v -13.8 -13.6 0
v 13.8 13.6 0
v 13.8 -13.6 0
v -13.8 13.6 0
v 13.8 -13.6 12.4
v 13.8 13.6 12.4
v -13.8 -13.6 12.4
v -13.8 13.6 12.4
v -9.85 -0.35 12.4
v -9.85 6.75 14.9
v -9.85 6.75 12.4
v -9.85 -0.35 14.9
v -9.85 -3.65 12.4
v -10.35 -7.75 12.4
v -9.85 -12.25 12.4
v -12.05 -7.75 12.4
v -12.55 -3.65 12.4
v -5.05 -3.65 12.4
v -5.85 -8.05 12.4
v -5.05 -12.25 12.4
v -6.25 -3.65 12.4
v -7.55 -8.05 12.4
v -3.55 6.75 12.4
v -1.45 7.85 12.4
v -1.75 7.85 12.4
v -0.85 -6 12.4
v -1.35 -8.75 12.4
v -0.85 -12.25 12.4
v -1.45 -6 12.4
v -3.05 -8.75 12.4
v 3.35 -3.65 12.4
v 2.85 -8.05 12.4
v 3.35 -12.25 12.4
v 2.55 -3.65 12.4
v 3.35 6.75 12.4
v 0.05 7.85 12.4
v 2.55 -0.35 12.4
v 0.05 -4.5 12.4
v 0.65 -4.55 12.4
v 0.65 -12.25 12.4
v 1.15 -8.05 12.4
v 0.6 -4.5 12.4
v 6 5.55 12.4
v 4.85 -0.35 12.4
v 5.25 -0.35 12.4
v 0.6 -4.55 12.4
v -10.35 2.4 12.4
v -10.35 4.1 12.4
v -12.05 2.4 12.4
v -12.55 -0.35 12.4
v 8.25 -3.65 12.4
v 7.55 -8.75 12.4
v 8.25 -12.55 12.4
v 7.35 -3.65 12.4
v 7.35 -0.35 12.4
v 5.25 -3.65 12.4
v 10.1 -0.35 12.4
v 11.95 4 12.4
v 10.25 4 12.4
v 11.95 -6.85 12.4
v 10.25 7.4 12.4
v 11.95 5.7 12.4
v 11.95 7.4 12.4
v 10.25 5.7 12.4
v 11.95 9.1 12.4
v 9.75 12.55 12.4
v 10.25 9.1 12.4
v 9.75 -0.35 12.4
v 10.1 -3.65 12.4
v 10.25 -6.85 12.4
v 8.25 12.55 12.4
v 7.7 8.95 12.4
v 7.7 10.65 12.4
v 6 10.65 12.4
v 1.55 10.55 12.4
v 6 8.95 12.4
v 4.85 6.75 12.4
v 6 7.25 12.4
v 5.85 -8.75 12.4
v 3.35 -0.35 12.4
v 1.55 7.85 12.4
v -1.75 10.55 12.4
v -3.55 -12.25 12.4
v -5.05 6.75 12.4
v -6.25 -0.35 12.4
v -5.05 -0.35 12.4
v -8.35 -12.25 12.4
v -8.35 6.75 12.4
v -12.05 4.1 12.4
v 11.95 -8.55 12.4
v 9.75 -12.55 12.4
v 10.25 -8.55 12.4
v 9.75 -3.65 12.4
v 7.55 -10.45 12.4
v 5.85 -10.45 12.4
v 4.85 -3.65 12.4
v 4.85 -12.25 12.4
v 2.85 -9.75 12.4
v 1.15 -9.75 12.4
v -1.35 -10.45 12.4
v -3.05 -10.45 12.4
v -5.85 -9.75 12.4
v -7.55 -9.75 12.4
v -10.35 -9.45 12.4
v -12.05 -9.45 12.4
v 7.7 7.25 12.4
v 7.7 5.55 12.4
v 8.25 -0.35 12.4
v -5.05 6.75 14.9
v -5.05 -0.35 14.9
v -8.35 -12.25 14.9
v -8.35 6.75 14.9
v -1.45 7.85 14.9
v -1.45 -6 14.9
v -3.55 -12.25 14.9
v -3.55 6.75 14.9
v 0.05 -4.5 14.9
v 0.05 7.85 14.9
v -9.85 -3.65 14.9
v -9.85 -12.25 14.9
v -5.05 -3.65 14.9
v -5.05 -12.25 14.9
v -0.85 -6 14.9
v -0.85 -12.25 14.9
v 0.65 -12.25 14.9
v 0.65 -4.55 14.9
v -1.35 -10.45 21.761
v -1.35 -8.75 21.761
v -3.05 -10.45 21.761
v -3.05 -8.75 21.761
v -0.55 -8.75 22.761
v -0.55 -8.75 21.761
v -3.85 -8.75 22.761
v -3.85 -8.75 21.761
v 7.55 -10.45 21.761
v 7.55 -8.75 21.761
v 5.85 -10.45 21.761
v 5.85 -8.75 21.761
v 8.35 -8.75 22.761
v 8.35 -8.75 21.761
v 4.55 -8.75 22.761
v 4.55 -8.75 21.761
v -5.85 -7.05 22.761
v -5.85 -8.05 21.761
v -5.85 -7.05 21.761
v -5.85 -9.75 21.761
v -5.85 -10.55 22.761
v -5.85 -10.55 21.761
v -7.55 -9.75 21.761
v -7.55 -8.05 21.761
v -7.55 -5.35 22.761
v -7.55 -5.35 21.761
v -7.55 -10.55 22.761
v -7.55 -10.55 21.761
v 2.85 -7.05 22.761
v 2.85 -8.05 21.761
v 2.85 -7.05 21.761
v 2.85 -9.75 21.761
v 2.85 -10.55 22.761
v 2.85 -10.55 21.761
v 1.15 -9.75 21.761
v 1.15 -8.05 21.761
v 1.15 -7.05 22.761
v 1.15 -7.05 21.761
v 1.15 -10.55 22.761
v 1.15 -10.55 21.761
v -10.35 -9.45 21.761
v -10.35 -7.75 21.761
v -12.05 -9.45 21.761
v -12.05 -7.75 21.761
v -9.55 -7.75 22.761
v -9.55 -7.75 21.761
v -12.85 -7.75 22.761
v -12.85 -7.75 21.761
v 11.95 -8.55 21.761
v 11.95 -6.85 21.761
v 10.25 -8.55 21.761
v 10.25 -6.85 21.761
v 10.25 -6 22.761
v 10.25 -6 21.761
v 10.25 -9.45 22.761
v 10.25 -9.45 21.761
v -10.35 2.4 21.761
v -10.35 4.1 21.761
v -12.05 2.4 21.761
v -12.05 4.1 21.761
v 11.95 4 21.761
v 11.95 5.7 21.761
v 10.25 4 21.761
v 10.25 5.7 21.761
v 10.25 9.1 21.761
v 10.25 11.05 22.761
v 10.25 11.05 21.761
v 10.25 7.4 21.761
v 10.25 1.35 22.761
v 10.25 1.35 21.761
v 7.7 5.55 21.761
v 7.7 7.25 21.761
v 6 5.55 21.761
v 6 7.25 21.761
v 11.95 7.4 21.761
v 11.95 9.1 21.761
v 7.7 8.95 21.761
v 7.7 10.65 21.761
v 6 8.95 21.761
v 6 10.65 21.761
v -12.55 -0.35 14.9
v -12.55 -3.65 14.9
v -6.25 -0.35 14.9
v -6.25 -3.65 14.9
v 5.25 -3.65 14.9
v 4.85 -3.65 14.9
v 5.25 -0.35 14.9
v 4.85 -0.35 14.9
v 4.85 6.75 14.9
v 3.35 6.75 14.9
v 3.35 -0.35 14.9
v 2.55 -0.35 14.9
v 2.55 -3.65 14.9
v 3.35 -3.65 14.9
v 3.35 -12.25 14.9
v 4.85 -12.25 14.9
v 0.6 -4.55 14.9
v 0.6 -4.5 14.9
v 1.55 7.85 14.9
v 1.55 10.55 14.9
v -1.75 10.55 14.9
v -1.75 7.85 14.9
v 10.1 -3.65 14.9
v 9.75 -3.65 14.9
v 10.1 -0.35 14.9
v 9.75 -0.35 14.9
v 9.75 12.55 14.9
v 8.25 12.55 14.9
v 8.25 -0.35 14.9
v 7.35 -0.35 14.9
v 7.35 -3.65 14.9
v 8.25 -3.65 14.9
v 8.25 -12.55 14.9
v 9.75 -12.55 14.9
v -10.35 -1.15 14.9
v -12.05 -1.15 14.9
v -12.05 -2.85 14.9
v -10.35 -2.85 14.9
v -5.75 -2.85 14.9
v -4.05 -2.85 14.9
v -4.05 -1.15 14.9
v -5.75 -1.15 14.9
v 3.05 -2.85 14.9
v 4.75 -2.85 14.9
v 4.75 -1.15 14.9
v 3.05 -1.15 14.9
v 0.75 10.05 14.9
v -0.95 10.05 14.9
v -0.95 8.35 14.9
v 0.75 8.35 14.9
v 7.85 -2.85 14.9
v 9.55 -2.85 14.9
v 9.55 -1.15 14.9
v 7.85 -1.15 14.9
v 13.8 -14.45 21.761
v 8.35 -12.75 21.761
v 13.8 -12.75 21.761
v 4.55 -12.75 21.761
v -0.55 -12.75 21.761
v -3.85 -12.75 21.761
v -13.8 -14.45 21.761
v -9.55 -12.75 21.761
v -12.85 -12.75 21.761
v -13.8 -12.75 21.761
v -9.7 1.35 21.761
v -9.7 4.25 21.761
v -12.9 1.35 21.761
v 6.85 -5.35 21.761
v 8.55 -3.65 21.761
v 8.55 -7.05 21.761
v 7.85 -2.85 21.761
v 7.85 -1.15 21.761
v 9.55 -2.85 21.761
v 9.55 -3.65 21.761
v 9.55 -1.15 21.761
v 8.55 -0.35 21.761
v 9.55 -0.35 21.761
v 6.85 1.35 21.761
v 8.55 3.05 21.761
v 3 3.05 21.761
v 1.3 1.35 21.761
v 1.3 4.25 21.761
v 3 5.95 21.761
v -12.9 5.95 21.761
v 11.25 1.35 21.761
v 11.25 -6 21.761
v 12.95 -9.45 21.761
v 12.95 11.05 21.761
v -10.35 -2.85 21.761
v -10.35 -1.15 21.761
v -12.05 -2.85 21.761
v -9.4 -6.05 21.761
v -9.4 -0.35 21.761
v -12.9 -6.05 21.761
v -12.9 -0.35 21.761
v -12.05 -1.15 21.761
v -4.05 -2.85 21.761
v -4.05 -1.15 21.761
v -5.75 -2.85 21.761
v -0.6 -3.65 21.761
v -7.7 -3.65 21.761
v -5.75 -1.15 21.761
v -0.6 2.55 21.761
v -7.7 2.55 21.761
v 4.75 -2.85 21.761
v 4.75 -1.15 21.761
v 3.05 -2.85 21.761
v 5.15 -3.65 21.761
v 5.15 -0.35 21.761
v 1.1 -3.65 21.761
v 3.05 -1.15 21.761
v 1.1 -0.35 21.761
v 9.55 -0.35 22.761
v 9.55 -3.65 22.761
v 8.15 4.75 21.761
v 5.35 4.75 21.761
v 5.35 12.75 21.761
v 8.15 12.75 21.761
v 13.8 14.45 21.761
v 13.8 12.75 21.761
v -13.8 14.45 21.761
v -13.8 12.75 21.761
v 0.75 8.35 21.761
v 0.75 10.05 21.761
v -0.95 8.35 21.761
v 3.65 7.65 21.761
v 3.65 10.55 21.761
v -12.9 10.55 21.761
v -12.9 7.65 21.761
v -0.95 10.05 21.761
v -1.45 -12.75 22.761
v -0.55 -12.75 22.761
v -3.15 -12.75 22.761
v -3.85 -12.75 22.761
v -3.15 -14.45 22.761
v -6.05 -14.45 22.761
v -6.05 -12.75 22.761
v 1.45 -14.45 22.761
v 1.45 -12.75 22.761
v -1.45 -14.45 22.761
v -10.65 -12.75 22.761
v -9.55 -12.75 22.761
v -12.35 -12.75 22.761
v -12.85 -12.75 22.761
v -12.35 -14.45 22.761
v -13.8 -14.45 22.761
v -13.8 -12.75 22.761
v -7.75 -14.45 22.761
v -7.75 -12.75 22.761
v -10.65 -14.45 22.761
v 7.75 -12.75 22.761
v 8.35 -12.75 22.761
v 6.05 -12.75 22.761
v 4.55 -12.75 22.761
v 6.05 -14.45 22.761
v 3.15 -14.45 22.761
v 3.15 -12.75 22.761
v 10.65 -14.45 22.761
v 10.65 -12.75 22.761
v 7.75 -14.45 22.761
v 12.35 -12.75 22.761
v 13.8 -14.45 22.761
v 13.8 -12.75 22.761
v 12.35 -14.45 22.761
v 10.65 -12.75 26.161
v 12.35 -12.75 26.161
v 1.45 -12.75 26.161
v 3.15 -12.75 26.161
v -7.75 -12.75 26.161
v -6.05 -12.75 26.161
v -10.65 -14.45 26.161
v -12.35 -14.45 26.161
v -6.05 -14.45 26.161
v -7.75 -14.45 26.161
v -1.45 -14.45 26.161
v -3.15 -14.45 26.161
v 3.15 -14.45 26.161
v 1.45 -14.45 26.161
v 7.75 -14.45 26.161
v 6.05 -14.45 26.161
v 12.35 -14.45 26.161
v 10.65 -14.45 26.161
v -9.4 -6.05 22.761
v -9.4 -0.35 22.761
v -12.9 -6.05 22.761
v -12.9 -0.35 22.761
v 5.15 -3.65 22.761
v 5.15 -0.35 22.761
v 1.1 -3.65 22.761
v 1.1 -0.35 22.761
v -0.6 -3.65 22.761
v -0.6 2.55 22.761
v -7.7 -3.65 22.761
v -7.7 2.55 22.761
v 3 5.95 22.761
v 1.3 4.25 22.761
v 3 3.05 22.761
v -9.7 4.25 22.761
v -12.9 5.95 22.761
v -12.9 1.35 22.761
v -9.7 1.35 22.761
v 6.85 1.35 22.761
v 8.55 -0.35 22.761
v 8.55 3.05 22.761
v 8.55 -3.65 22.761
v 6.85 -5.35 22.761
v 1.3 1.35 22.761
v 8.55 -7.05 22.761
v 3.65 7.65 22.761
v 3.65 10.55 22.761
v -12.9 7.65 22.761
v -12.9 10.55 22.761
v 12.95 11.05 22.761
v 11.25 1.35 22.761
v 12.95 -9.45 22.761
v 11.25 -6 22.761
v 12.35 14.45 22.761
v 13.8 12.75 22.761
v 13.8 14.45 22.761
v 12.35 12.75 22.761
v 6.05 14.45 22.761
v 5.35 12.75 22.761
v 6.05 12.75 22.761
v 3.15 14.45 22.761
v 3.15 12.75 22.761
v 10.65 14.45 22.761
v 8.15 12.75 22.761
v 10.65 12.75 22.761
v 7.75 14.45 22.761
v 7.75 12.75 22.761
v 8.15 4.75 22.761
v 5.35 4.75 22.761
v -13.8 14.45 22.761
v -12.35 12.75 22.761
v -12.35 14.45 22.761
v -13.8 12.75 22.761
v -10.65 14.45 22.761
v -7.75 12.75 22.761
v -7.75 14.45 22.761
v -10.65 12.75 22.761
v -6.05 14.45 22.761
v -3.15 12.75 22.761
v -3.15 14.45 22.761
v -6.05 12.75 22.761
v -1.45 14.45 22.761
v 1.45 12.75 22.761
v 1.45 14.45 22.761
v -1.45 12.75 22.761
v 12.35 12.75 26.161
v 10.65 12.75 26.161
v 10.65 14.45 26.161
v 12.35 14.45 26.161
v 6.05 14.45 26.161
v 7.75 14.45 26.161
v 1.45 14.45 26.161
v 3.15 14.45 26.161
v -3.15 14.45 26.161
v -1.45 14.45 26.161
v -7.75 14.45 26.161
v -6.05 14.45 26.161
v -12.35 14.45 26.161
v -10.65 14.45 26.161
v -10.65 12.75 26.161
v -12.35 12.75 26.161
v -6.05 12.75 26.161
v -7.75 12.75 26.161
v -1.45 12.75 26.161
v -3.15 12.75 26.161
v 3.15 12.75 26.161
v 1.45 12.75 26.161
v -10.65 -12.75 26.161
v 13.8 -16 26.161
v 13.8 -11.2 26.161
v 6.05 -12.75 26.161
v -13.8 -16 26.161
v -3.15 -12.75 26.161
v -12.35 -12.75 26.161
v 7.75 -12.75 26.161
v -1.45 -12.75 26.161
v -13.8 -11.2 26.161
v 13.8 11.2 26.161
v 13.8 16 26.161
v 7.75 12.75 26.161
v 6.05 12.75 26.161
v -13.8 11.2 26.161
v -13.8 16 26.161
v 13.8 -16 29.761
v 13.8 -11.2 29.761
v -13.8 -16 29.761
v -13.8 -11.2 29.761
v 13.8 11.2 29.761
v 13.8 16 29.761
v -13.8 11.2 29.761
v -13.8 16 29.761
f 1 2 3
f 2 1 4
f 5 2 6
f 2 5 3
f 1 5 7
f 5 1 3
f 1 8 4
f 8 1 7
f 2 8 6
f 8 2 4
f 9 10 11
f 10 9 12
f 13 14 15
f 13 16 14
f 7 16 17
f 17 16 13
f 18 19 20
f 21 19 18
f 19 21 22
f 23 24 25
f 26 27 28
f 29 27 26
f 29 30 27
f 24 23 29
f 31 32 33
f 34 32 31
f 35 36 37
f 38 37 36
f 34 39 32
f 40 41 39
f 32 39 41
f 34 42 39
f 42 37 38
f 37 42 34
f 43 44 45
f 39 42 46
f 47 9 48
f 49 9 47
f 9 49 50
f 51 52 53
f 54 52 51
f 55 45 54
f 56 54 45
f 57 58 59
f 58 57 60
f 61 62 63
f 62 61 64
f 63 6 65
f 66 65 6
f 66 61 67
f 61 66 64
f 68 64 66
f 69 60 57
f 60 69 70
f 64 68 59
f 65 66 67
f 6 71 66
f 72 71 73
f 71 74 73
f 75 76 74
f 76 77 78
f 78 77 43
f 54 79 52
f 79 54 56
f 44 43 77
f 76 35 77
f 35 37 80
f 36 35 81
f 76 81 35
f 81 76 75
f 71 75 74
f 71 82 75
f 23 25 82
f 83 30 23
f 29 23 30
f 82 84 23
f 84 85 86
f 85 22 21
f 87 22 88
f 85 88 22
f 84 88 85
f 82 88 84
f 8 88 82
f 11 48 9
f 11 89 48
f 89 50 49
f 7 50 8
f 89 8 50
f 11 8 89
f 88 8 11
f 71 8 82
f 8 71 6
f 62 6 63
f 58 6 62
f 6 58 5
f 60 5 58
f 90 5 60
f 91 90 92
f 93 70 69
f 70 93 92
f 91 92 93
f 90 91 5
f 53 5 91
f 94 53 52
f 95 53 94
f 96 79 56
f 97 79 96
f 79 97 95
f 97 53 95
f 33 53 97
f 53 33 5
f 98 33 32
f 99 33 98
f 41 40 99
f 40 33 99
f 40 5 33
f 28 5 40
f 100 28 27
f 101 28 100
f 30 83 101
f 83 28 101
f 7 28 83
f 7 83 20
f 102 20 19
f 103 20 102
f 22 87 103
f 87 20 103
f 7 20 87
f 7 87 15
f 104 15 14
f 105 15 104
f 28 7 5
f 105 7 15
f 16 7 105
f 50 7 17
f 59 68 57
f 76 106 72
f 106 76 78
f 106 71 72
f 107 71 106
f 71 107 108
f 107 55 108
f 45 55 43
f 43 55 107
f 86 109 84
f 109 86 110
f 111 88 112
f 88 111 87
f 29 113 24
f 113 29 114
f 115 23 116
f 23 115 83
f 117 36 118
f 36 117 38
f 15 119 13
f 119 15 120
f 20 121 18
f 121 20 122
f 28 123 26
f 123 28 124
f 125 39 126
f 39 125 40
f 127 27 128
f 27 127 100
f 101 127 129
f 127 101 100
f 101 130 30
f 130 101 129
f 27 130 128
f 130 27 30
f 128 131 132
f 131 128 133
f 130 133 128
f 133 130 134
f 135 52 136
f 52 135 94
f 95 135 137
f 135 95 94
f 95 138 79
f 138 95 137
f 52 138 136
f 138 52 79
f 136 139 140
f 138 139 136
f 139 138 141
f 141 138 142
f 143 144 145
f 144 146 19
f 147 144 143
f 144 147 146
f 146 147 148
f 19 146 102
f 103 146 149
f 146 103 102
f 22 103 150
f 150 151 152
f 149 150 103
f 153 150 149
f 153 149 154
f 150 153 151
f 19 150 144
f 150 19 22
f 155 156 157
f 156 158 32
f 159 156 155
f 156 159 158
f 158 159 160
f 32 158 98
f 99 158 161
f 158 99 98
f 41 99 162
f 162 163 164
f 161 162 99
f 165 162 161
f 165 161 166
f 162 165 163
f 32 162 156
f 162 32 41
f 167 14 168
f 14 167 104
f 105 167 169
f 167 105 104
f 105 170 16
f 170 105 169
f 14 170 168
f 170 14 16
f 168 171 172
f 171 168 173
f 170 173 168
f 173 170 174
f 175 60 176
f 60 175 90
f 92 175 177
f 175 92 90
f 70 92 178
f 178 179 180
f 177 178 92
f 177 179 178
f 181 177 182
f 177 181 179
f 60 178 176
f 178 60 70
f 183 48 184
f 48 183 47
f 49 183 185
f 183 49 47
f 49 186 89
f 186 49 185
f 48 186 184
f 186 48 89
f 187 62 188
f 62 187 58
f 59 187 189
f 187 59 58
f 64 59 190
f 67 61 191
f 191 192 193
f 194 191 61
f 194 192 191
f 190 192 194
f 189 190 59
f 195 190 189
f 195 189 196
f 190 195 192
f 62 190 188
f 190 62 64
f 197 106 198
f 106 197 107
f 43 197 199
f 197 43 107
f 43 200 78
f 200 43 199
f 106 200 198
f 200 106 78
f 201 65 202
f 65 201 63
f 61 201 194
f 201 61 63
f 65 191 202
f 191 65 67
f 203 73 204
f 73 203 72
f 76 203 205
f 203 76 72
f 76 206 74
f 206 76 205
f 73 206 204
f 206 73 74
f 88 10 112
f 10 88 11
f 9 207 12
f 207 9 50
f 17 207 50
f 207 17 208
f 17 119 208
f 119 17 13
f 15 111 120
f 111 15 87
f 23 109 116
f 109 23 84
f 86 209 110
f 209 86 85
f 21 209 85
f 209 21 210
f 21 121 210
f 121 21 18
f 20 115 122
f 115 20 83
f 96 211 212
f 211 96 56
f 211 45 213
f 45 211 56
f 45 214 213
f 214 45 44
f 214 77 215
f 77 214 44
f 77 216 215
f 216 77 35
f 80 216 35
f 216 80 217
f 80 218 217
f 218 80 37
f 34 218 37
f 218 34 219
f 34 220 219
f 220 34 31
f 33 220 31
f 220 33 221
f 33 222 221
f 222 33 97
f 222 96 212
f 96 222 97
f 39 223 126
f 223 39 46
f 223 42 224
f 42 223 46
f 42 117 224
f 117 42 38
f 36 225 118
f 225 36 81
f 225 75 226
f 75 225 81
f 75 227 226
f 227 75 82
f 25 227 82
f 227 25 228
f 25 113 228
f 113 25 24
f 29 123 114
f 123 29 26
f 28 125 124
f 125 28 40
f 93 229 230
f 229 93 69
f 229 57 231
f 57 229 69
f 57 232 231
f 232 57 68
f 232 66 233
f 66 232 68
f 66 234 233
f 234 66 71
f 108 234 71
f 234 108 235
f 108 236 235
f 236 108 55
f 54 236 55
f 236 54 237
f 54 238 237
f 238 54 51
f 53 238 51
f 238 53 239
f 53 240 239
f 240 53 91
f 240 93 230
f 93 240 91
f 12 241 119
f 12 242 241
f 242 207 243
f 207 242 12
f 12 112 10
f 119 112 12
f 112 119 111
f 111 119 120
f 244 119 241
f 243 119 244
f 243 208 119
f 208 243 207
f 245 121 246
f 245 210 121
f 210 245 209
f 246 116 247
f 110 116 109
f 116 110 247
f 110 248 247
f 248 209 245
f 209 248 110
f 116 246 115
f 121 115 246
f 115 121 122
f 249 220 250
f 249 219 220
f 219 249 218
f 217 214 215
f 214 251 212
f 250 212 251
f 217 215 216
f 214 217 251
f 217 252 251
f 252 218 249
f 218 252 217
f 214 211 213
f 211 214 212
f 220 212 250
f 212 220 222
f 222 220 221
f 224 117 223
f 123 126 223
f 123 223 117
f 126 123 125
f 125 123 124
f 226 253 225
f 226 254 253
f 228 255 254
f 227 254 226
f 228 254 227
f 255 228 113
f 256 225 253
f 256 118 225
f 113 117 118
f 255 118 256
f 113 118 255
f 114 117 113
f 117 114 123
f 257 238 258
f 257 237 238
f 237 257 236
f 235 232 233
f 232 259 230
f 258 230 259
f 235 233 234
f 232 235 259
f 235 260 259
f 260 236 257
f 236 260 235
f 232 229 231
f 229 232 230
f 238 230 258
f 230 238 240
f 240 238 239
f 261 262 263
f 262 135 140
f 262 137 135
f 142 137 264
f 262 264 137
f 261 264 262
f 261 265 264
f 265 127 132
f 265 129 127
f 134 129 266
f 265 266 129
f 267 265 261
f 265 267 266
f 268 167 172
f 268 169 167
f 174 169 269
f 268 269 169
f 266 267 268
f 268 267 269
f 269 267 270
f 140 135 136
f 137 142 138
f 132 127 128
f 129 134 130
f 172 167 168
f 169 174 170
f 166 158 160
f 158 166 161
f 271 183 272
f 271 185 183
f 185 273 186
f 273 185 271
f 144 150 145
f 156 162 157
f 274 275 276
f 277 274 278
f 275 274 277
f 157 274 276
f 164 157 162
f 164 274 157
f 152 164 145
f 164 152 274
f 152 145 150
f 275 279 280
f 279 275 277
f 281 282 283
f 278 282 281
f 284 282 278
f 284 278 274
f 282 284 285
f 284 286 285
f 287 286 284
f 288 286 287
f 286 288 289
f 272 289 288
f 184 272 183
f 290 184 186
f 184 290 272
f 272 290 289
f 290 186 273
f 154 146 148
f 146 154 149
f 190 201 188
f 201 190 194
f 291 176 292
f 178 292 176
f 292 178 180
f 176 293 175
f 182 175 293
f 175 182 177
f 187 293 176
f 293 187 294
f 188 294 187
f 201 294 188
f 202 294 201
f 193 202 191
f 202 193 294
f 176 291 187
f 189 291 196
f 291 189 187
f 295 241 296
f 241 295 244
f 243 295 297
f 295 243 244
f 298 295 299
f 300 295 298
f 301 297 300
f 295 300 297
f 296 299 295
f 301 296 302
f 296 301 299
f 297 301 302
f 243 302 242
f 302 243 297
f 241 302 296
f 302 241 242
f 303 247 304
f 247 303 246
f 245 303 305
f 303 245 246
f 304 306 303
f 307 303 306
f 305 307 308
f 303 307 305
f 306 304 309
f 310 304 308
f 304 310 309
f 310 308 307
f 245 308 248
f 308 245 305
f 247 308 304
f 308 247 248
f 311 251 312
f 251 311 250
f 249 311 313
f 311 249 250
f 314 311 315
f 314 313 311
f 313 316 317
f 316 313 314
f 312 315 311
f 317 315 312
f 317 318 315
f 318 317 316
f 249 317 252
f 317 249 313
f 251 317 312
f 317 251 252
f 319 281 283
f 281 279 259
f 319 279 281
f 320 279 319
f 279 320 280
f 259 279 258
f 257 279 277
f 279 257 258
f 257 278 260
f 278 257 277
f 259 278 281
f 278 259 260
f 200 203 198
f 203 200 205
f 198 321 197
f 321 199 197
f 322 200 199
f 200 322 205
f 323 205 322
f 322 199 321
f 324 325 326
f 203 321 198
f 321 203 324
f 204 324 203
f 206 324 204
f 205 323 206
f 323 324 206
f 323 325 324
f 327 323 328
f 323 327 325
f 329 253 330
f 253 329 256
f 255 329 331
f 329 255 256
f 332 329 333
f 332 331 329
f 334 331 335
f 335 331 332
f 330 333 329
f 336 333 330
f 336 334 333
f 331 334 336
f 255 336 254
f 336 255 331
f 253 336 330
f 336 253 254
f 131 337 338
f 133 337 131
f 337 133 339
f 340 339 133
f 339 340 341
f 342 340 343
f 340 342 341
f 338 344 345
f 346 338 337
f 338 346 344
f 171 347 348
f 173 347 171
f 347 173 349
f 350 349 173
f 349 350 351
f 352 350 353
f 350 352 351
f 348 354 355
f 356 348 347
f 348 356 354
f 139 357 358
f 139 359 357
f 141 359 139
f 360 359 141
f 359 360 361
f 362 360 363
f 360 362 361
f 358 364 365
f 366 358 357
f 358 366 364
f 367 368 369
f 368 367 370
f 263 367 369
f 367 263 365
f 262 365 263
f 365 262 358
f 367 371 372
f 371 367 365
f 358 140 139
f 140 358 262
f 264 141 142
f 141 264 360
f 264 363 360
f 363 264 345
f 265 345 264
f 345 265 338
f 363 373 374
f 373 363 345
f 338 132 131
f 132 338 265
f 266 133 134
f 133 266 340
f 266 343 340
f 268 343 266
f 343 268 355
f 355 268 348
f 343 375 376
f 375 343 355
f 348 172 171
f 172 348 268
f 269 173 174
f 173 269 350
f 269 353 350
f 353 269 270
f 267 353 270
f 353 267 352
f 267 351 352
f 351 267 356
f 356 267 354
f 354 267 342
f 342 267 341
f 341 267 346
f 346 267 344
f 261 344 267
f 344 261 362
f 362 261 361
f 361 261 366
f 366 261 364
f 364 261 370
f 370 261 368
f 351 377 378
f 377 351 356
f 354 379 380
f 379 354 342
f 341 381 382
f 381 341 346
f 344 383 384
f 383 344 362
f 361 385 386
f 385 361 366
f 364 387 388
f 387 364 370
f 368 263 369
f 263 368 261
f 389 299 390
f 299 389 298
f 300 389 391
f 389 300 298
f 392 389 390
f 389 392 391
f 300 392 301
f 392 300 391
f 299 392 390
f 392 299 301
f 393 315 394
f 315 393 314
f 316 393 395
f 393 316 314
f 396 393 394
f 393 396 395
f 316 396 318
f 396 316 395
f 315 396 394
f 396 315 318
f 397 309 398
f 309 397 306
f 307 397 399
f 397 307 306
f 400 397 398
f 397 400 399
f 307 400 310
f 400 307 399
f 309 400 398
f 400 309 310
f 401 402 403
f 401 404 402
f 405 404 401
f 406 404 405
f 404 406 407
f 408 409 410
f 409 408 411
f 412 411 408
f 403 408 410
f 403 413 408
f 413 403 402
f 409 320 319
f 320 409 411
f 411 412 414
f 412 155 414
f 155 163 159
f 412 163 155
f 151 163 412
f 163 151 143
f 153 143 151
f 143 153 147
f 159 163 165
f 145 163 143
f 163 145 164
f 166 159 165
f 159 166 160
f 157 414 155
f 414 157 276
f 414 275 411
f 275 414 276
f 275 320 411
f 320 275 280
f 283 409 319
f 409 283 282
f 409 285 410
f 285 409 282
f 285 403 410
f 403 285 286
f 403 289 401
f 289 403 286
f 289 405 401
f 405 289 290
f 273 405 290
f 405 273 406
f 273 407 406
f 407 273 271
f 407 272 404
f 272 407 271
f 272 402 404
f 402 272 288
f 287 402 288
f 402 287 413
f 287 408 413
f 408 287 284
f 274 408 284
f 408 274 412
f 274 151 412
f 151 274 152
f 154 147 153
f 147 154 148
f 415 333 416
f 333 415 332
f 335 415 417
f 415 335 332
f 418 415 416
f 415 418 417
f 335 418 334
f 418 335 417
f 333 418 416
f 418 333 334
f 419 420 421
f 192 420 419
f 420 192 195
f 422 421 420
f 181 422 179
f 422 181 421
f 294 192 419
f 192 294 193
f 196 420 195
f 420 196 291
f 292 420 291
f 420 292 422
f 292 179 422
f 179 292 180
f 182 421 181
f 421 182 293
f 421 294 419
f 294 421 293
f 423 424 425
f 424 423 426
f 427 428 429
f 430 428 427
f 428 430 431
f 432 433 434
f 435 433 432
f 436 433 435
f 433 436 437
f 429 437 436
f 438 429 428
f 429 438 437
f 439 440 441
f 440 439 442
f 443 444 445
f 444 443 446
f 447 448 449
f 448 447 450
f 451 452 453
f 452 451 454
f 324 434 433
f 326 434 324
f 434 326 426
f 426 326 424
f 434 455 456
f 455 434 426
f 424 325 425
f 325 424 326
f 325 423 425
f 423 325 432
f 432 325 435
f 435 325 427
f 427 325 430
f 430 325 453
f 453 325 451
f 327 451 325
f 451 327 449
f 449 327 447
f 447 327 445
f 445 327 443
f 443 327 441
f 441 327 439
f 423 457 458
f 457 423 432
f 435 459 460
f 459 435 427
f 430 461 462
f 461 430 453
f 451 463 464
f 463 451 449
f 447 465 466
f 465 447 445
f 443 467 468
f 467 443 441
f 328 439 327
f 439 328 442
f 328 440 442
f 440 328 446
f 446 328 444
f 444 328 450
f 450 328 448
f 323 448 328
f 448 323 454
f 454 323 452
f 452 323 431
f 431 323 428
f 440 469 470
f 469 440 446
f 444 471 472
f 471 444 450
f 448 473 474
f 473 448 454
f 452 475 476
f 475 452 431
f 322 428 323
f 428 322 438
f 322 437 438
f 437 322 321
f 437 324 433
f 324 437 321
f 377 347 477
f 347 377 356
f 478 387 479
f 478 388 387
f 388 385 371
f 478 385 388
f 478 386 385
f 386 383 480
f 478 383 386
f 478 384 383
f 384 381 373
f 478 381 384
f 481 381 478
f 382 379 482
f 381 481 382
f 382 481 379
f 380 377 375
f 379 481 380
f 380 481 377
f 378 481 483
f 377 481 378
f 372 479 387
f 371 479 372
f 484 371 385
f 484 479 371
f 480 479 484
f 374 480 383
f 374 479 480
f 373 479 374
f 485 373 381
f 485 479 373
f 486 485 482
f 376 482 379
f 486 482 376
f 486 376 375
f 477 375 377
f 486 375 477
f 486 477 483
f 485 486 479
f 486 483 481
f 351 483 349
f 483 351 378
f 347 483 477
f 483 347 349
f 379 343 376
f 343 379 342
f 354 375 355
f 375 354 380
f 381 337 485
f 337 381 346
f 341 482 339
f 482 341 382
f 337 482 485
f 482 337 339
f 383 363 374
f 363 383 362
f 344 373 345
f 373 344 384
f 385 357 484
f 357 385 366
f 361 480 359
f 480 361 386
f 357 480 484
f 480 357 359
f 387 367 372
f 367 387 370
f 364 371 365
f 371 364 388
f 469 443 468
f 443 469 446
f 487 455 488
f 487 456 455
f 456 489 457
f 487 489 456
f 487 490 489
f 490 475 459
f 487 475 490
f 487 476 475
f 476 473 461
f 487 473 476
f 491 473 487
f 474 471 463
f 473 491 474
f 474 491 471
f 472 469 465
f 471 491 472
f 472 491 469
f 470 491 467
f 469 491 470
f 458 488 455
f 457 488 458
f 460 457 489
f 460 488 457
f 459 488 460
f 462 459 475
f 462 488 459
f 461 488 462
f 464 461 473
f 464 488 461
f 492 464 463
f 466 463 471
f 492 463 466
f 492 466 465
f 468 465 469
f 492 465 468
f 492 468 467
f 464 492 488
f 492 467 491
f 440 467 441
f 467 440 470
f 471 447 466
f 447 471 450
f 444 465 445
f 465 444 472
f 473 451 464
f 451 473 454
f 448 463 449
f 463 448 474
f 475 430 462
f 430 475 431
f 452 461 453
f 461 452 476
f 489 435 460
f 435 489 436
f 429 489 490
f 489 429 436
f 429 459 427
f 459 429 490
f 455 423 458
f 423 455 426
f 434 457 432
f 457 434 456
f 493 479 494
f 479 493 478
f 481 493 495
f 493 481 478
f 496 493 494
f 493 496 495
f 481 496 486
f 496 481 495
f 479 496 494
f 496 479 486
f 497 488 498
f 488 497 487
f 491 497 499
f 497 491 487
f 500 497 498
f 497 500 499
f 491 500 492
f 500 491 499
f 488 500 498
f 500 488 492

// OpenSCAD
// Generated by SolidPython 0.4.2 on 2020-09-29 23:22:15
//!OpenSCAD

scale(v = 0.0100000000) {
	translate(v = [-1380, -1360, 0]) {
		union() {
			color(c = [0.4000000000, 0.4000000000, 0.4000000000]) {
				translate(v = [0, 0, 0]) {
					linear_extrude(height = 1000.0000000000) {
						polygon(paths = [[0, 1, 2, 3]], points = [[0, 0], [0, 2720], [2760, 2720], [2760, 0]]);
					}
				}
			}
			color(c = [0.2000000000, 0.6000000000, 0.2000000000]) {
				translate(v = [0, 0, 1000.0000000000]) {
					linear_extrude(height = 120.0000000000) {
						polygon(paths = [[0, 1, 2, 3]], points = [[0, 1305], [0, 2720], [2760, 2720], [2760, 1305]]);
					}
				}
			}
			color(c = [0.4000000000, 0.4000000000, 0.4000000000]) {
				translate(v = [0, 0, 1000.0000000000]) {
					linear_extrude(height = 120.0000000000) {
						polygon(paths = [[0, 1, 2, 3]], points = [[0, 0], [0, 1305], [2760, 1305], [2760, 0]]);
					}
				}
			}
			color(c = [0.9000000000, 0.6000000000, 0.6000000000]) {
				translate(v = [0, 0, 1120.0000000000]) {
					linear_extrude(height = 120.0000000000) {
						polygon(paths = [[0, 1, 2, 3]], points = [[135, 1485], [135, 1905], [395, 1905], [395, 1485]]);
					}
				}
			}
			color(c = [0.9000000000, 0.6000000000, 0.6000000000]) {
				translate(v = [0, 0, 1120.0000000000]) {
					linear_extrude(height = 120.0000000000) {
						polygon(paths = [[0, 1, 2, 3]], points = [[545, 1485], [545, 1905], [875, 1905], [875, 1485]]);
					}
				}
			}
			color(c = [0.9000000000, 0.6000000000, 0.6000000000]) {
				translate(v = [0, 0, 1120.0000000000]) {
					linear_extrude(height = 120.0000000000) {
						polygon(paths = [[0, 1, 2, 3]], points = [[1025, 1485], [1025, 1905], [1235, 1905], [1235, 1485]]);
					}
				}
			}
			color(c = [0.9000000000, 0.6000000000, 0.6000000000]) {
				translate(v = [0, 0, 1120.0000000000]) {
					linear_extrude(height = 120.0000000000) {
						polygon(paths = [[0, 1, 2, 3]], points = [[1385, 1485], [1385, 1905], [1715, 1905], [1715, 1485]]);
					}
				}
			}
			color(c = [0.9000000000, 0.6000000000, 0.6000000000]) {
				translate(v = [0, 0, 1120.0000000000]) {
					linear_extrude(height = 120.0000000000) {
						polygon(paths = [[0, 1, 2, 3, 4, 5]], points = [[1865, 1485], [1865, 1905], [1940, 1905], [1940, 2485], [2205, 2485], [2205, 1485]]);
					}
				}
			}
			color(c = [0.9000000000, 0.6000000000, 0.6000000000]) {
				translate(v = [0, 0, 1120.0000000000]) {
					linear_extrude(height = 120.0000000000) {
						polygon(paths = [[0, 1, 2, 3]], points = [[2355, 1485], [2355, 2485], [2625, 2485], [2625, 1485]]);
					}
				}
			}
			color(c = [0.9000000000, 0.6000000000, 0.9000000000]) {
				translate(v = [0, 0, 1120.0000000000]) {
					linear_extrude(height = 120.0000000000) {
						polygon(paths = [[0, 1, 2, 3]], points = [[135, 265], [135, 685], [395, 685], [395, 265]]);
					}
				}
			}
			color(c = [0.9000000000, 0.6000000000, 0.9000000000]) {
				translate(v = [0, 0, 1120.0000000000]) {
					linear_extrude(height = 120.0000000000) {
						polygon(paths = [[0, 1, 2, 3]], points = [[545, 265], [545, 685], [875, 685], [875, 265]]);
					}
				}
			}
			color(c = [0.9000000000, 0.6000000000, 0.9000000000]) {
				translate(v = [0, 0, 1120.0000000000]) {
					linear_extrude(height = 120.0000000000) {
						polygon(paths = [[0, 1, 2, 3]], points = [[1025, 265], [1025, 685], [1295, 685], [1295, 265]]);
					}
				}
			}
			color(c = [0.9000000000, 0.6000000000, 0.9000000000]) {
				translate(v = [0, 0, 1120.0000000000]) {
					linear_extrude(height = 120.0000000000) {
						polygon(paths = [[0, 1, 2, 3]], points = [[1445, 265], [1445, 685], [1715, 685], [1715, 265]]);
					}
				}
			}
			color(c = [0.9000000000, 0.6000000000, 0.9000000000]) {
				translate(v = [0, 0, 1120.0000000000]) {
					linear_extrude(height = 120.0000000000) {
						polygon(paths = [[0, 1, 2, 3, 4, 5, 6, 7]], points = [[1940, 235], [1940, 265], [1865, 265], [1865, 685], [1940, 685], [1940, 885], [2205, 885], [2205, 235]]);
					}
				}
			}
			color(c = [0.9000000000, 0.6000000000, 0.9000000000]) {
				translate(v = [0, 0, 1120.0000000000]) {
					linear_extrude(height = 120.0000000000) {
						polygon(paths = [[0, 1, 2, 3]], points = [[2355, 235], [2355, 885], [2625, 885], [2625, 235]]);
					}
				}
			}
			color(c = [0.2000000000, 0.6000000000, 0.2000000000]) {
				translate(v = [0, 0, 1120.0000000000]) {
					linear_extrude(height = 120.0000000000) {
						difference() {
							polygon(paths = [[0, 1, 2, 3]], points = [[0, 1305], [0, 2720], [2760, 2720], [2760, 1305]]);
							polygon(paths = [[0, 1, 2, 3]], points = [[135, 1485], [395, 1485], [395, 1905], [135, 1905]]);
							polygon(paths = [[0, 1, 2, 3]], points = [[545, 1485], [875, 1485], [875, 1905], [545, 1905]]);
							polygon(paths = [[0, 1, 2, 3]], points = [[1025, 1485], [1235, 1485], [1235, 1905], [1025, 1905]]);
							polygon(paths = [[0, 1, 2, 3]], points = [[1385, 1485], [1715, 1485], [1715, 1905], [1385, 1905]]);
							polygon(paths = [[0, 1, 2, 3]], points = [[2355, 1485], [2625, 1485], [2625, 2485], [2355, 2485]]);
							polygon(paths = [[0, 1, 2, 3, 4, 5]], points = [[1865, 1485], [2205, 1485], [2205, 2485], [1940, 2485], [1940, 1905], [1865, 1905]]);
						}
					}
				}
			}
			color(c = [0.4000000000, 0.4000000000, 0.4000000000]) {
				translate(v = [0, 0, 1120.0000000000]) {
					linear_extrude(height = 120.0000000000) {
						difference() {
							polygon(paths = [[0, 1, 2, 3]], points = [[0, 0], [0, 1305], [2760, 1305], [2760, 0]]);
							polygon(paths = [[0, 1, 2, 3]], points = [[2355, 235], [2625, 235], [2625, 885], [2355, 885]]);
							polygon(paths = [[0, 1, 2, 3]], points = [[135, 265], [395, 265], [395, 685], [135, 685]]);
							polygon(paths = [[0, 1, 2, 3]], points = [[545, 265], [875, 265], [875, 685], [545, 685]]);
							polygon(paths = [[0, 1, 2, 3]], points = [[1025, 265], [1295, 265], [1295, 685], [1025, 685]]);
							polygon(paths = [[0, 1, 2, 3]], points = [[1445, 265], [1715, 265], [1715, 685], [1445, 685]]);
							polygon(paths = [[0, 1, 2, 3, 4, 5, 6, 7]], points = [[1940, 235], [2205, 235], [2205, 885], [1940, 885], [1940, 685], [1865, 685], [1865, 265], [1940, 265]]);
						}
					}
				}
			}
			color(c = [0.1000000000, 0.1000000000, 0.1000000000]) {
				translate(v = [0, 0, 1240.0000000000]) {
					linear_extrude(height = 70.0000000000) {
						polygon(paths = [[0, 1, 2, 3]], points = [[1075, 315], [1075, 485], [1245, 485], [1245, 315]]);
					}
				}
			}
			color(c = [0.1000000000, 0.1000000000, 0.1000000000]) {
				translate(v = [0, 0, 1240.0000000000]) {
					linear_extrude(height = 70.0000000000) {
						polygon(paths = [[0, 1, 2, 3]], points = [[1965, 315], [1965, 485], [2135, 485], [2135, 315]]);
					}
				}
			}
			color(c = [0.1000000000, 0.1000000000, 0.1000000000]) {
				translate(v = [0, 0, 1240.0000000000]) {
					linear_extrude(height = 70.0000000000) {
						polygon(paths = [[0, 1, 2, 3]], points = [[625, 385], [625, 555], [795, 555], [795, 385]]);
					}
				}
			}
			color(c = [0.1000000000, 0.1000000000, 0.1000000000]) {
				translate(v = [0, 0, 1240.0000000000]) {
					linear_extrude(height = 70.0000000000) {
						polygon(paths = [[0, 1, 2, 3]], points = [[1495, 385], [1495, 555], [1665, 555], [1665, 385]]);
					}
				}
			}
			color(c = [0.1000000000, 0.1000000000, 0.1000000000]) {
				translate(v = [0, 0, 1240.0000000000]) {
					linear_extrude(height = 70.0000000000) {
						polygon(paths = [[0, 1, 2, 3]], points = [[175, 415], [175, 585], [345, 585], [345, 415]]);
					}
				}
			}
			color(c = [0.1000000000, 0.1000000000, 0.1000000000]) {
				translate(v = [0, 0, 1240.0000000000]) {
					linear_extrude(height = 70.0000000000) {
						polygon(paths = [[0, 1, 2, 3]], points = [[2405, 505], [2405, 675], [2575, 675], [2575, 505]]);
					}
				}
			}
			color(c = [0.1000000000, 0.1000000000, 0.1000000000]) {
				translate(v = [0, 0, 1240.0000000000]) {
					linear_extrude(height = 70.0000000000) {
						polygon(paths = [[0, 1, 2, 3]], points = [[175, 1600], [175, 1770], [345, 1770], [345, 1600]]);
					}
				}
			}
			color(c = [0.1000000000, 0.1000000000, 0.1000000000]) {
				translate(v = [0, 0, 1240.0000000000]) {
					linear_extrude(height = 70.0000000000) {
						polygon(paths = [[0, 1, 2, 3]], points = [[2405, 1760], [2405, 1930], [2575, 1930], [2575, 1760]]);
					}
				}
			}
			color(c = [0.1000000000, 0.1000000000, 0.1000000000]) {
				translate(v = [0, 0, 1240.0000000000]) {
					linear_extrude(height = 70.0000000000) {
						polygon(paths = [[0, 1, 2, 3]], points = [[1980, 1915], [1980, 2085], [2150, 2085], [2150, 1915]]);
					}
				}
			}
			color(c = [0.1000000000, 0.1000000000, 0.1000000000]) {
				translate(v = [0, 0, 1240.0000000000]) {
					linear_extrude(height = 70.0000000000) {
						polygon(paths = [[0, 1, 2, 3]], points = [[2405, 2100], [2405, 2270], [2575, 2270], [2575, 2100]]);
					}
				}
			}
			color(c = [0.1000000000, 0.1000000000, 0.1000000000]) {
				translate(v = [0, 0, 1240.0000000000]) {
					linear_extrude(height = 70.0000000000) {
						polygon(paths = [[0, 1, 2, 3]], points = [[1980, 2255], [1980, 2425], [2150, 2425], [2150, 2255]]);
					}
				}
			}
			color(c = [1.0000000000, 1.0000000000, 1.0000000000]) {
				translate(v = [0, 0, 1240.0000000000]) {
					linear_extrude(height = 70.0000000000) {
						polygon(paths = [[0, 1, 2, 3, 4, 5, 6, 7]], points = [[395, 135], [395, 995], [125, 995], [125, 1325], [395, 1325], [395, 2035], [545, 2035], [545, 135]]);
					}
				}
			}
			color(c = [1.0000000000, 1.0000000000, 1.0000000000]) {
				translate(v = [0, 0, 1240.0000000000]) {
					linear_extrude(height = 70.0000000000) {
						polygon(paths = [[0, 1, 2, 3, 4, 5, 6, 7]], points = [[875, 135], [875, 995], [755, 995], [755, 1325], [875, 1325], [875, 2035], [1025, 2035], [1025, 135]]);
					}
				}
			}
			color(c = [1.0000000000, 1.0000000000, 1.0000000000]) {
				translate(v = [0, 0, 1240.0000000000]) {
					linear_extrude(height = 70.0000000000) {
						polygon(paths = [[0, 1, 2, 3, 4, 5, 6, 7, 8, 9, 10, 11]], points = [[1715, 135], [1715, 995], [1635, 995], [1635, 1325], [1715, 1325], [1715, 2035], [1865, 2035], [1865, 1325], [1905, 1325], [1905, 995], [1865, 995], [1865, 135]]);
					}
				}
			}
			color(c = [1.0000000000, 1.0000000000, 1.0000000000]) {
				translate(v = [0, 0, 1240.0000000000]) {
					linear_extrude(height = 70.0000000000) {
						polygon(paths = [[0, 1, 2, 3, 4, 5, 6, 7, 8, 9, 10, 11, 12, 13]], points = [[1295, 135], [1295, 760], [1235, 760], [1235, 2145], [1205, 2145], [1205, 2415], [1535, 2415], [1535, 2145], [1385, 2145], [1385, 910], [1440, 910], [1440, 905], [1445, 905], [1445, 135]]);
					}
				}
			}
			color(c = [1.0000000000, 1.0000000000, 1.0000000000]) {
				translate(v = [0, 0, 1240.0000000000]) {
					linear_extrude(height = 70.0000000000) {
						polygon(paths = [[0, 1, 2, 3, 4, 5, 6, 7, 8, 9, 10, 11]], points = [[2205, 105], [2205, 995], [2115, 995], [2115, 1325], [2205, 1325], [2205, 2615], [2355, 2615], [2355, 1325], [2390, 1325], [2390, 995], [2355, 995], [2355, 105]]);
					}
				}
			}
			color(c = [0.1000000000, 0.1000000000, 0.1000000000]) {
				translate(v = [0, 0, 1310.0000000000]) {
					linear_extrude(height = 180.0000000000) {
						polygon(paths = [[0, 1, 2, 3]], points = [[1075, 315], [1075, 485], [1245, 485], [1245, 315]]);
					}
				}
			}
			color(c = [0.1000000000, 0.1000000000, 0.1000000000]) {
				translate(v = [0, 0, 1310.0000000000]) {
					linear_extrude(height = 180.0000000000) {
						polygon(paths = [[0, 1, 2, 3]], points = [[1965, 315], [1965, 485], [2135, 485], [2135, 315]]);
					}
				}
			}
			color(c = [0.1000000000, 0.1000000000, 0.1000000000]) {
				translate(v = [0, 0, 1310.0000000000]) {
					linear_extrude(height = 180.0000000000) {
						polygon(paths = [[0, 1, 2, 3]], points = [[625, 385], [625, 555], [795, 555], [795, 385]]);
					}
				}
			}
			color(c = [0.1000000000, 0.1000000000, 0.1000000000]) {
				translate(v = [0, 0, 1310.0000000000]) {
					linear_extrude(height = 180.0000000000) {
						polygon(paths = [[0, 1, 2, 3]], points = [[1495, 385], [1495, 555], [1665, 555], [1665, 385]]);
					}
				}
			}
			color(c = [0.1000000000, 0.1000000000, 0.1000000000]) {
				translate(v = [0, 0, 1310.0000000000]) {
					linear_extrude(height = 180.0000000000) {
						polygon(paths = [[0, 1, 2, 3]], points = [[175, 415], [175, 585], [345, 585], [345, 415]]);
					}
				}
			}
			color(c = [0.1000000000, 0.1000000000, 0.1000000000]) {
				translate(v = [0, 0, 1310.0000000000]) {
					linear_extrude(height = 180.0000000000) {
						polygon(paths = [[0, 1, 2, 3]], points = [[2405, 505], [2405, 675], [2575, 675], [2575, 505]]);
					}
				}
			}
			color(c = [0.1000000000, 0.1000000000, 0.1000000000]) {
				translate(v = [0, 0, 1310.0000000000]) {
					linear_extrude(height = 180.0000000000) {
						polygon(paths = [[0, 1, 2, 3]], points = [[175, 1600], [175, 1770], [345, 1770], [345, 1600]]);
					}
				}
			}
			color(c = [0.1000000000, 0.1000000000, 0.1000000000]) {
				translate(v = [0, 0, 1310.0000000000]) {
					linear_extrude(height = 180.0000000000) {
						polygon(paths = [[0, 1, 2, 3]], points = [[2405, 1760], [2405, 1930], [2575, 1930], [2575, 1760]]);
					}
				}
			}
			color(c = [0.1000000000, 0.1000000000, 0.1000000000]) {
				translate(v = [0, 0, 1310.0000000000]) {
					linear_extrude(height = 180.0000000000) {
						polygon(paths = [[0, 1, 2, 3]], points = [[1980, 1915], [1980, 2085], [2150, 2085], [2150, 1915]]);
					}
				}
			}
			color(c = [0.1000000000, 0.1000000000, 0.1000000000]) {
				translate(v = [0, 0, 1310.0000000000]) {
					linear_extrude(height = 180.0000000000) {
						polygon(paths = [[0, 1, 2, 3]], points = [[2405, 2100], [2405, 2270], [2575, 2270], [2575, 2100]]);
					}
				}
			}
			color(c = [0.1000000000, 0.1000000000, 0.1000000000]) {
				translate(v = [0, 0, 1310.0000000000]) {
					linear_extrude(height = 180.0000000000) {
						polygon(paths = [[0, 1, 2, 3]], points = [[1980, 2255], [1980, 2425], [2150, 2425], [2150, 2255]]);
					}
				}
			}
			color(c = [0.7000000000, 0, 0]) {
				translate(v = [0, 0, 1310.0000000000]) {
					linear_extrude(height = 180.0000000000) {
						polygon(paths = [[0, 1, 2, 3, 4, 5, 6, 7]], points = [[395, 135], [395, 995], [125, 995], [125, 1325], [395, 1325], [395, 2035], [545, 2035], [545, 135]]);
					}
				}
			}
			color(c = [0.7000000000, 0, 0]) {
				translate(v = [0, 0, 1310.0000000000]) {
					linear_extrude(height = 180.0000000000) {
						polygon(paths = [[0, 1, 2, 3, 4, 5, 6, 7]], points = [[875, 135], [875, 995], [755, 995], [755, 1325], [875, 1325], [875, 2035], [1025, 2035], [1025, 135]]);
					}
				}
			}
			color(c = [0.7000000000, 0, 0]) {
				translate(v = [0, 0, 1310.0000000000]) {
					linear_extrude(height = 180.0000000000) {
						polygon(paths = [[0, 1, 2, 3, 4, 5, 6, 7, 8, 9, 10, 11]], points = [[1715, 135], [1715, 995], [1635, 995], [1635, 1325], [1715, 1325], [1715, 2035], [1865, 2035], [1865, 1325], [1905, 1325], [1905, 995], [1865, 995], [1865, 135]]);
					}
				}
			}
			color(c = [0.7000000000, 0, 0]) {
				translate(v = [0, 0, 1310.0000000000]) {
					linear_extrude(height = 180.0000000000) {
						polygon(paths = [[0, 1, 2, 3, 4, 5, 6, 7, 8, 9, 10, 11, 12, 13]], points = [[1295, 135], [1295, 760], [1235, 760], [1235, 2145], [1205, 2145], [1205, 2415], [1535, 2415], [1535, 2145], [1385, 2145], [1385, 910], [1440, 910], [1440, 905], [1445, 905], [1445, 135]]);
					}
				}
			}
			color(c = [0.7000000000, 0, 0]) {
				translate(v = [0, 0, 1310.0000000000]) {
					linear_extrude(height = 180.0000000000) {
						polygon(paths = [[0, 1, 2, 3, 4, 5, 6, 7, 8, 9, 10, 11]], points = [[2205, 105], [2205, 995], [2115, 995], [2115, 1325], [2205, 1325], [2205, 2615], [2355, 2615], [2355, 1325], [2390, 1325], [2390, 995], [2355, 995], [2355, 105]]);
					}
				}
			}
			color(c = [0.1000000000, 0.1000000000, 0.1000000000]) {
				translate(v = [0, 0, 1490.0000000000]) {
					linear_extrude(height = 686.1000000000) {
						polygon(paths = [[0, 1, 2, 3]], points = [[1075, 315], [1075, 485], [1245, 485], [1245, 315]]);
					}
				}
			}
			color(c = [0.1000000000, 0.1000000000, 0.1000000000]) {
				translate(v = [0, 0, 1490.0000000000]) {
					linear_extrude(height = 686.1000000000) {
						polygon(paths = [[0, 1, 2, 3]], points = [[1965, 315], [1965, 485], [2135, 485], [2135, 315]]);
					}
				}
			}
			color(c = [0.1000000000, 0.1000000000, 0.1000000000]) {
				translate(v = [0, 0, 1490.0000000000]) {
					linear_extrude(height = 686.1000000000) {
						polygon(paths = [[0, 1, 2, 3]], points = [[625, 385], [625, 555], [795, 555], [795, 385]]);
					}
				}
			}
			color(c = [0.1000000000, 0.1000000000, 0.1000000000]) {
				translate(v = [0, 0, 1490.0000000000]) {
					linear_extrude(height = 686.1000000000) {
						polygon(paths = [[0, 1, 2, 3]], points = [[1495, 385], [1495, 555], [1665, 555], [1665, 385]]);
					}
				}
			}
			color(c = [0.1000000000, 0.1000000000, 0.1000000000]) {
				translate(v = [0, 0, 1490.0000000000]) {
					linear_extrude(height = 686.1000000000) {
						polygon(paths = [[0, 1, 2, 3]], points = [[175, 415], [175, 585], [345, 585], [345, 415]]);
					}
				}
			}
			color(c = [0.1000000000, 0.1000000000, 0.1000000000]) {
				translate(v = [0, 0, 1490.0000000000]) {
					linear_extrude(height = 686.1000000000) {
						polygon(paths = [[0, 1, 2, 3]], points = [[2405, 505], [2405, 675], [2575, 675], [2575, 505]]);
					}
				}
			}
			color(c = [0.1000000000, 0.1000000000, 0.1000000000]) {
				translate(v = [0, 0, 1490.0000000000]) {
					linear_extrude(height = 686.1000000000) {
						polygon(paths = [[0, 1, 2, 3]], points = [[175, 1075], [175, 1245], [345, 1245], [345, 1075]]);
					}
				}
			}
			color(c = [0.1000000000, 0.1000000000, 0.1000000000]) {
				translate(v = [0, 0, 1490.0000000000]) {
					linear_extrude(height = 686.1000000000) {
						polygon(paths = [[0, 1, 2, 3]], points = [[805, 1075], [805, 1245], [975, 1245], [975, 1075]]);
					}
				}
			}
			color(c = [0.1000000000, 0.1000000000, 0.1000000000]) {
				translate(v = [0, 0, 1490.0000000000]) {
					linear_extrude(height = 686.1000000000) {
						polygon(paths = [[0, 1, 2, 3]], points = [[1685, 1075], [1685, 1245], [1855, 1245], [1855, 1075]]);
					}
				}
			}
			color(c = [0.1000000000, 0.1000000000, 0.1000000000]) {
				translate(v = [0, 0, 1490.0000000000]) {
					linear_extrude(height = 686.1000000000) {
						polygon(paths = [[0, 1, 2, 3]], points = [[2165, 1075], [2165, 1245], [2335, 1245], [2335, 1075]]);
					}
				}
			}
			color(c = [0.1000000000, 0.1000000000, 0.1000000000]) {
				translate(v = [0, 0, 1490.0000000000]) {
					linear_extrude(height = 686.1000000000) {
						polygon(paths = [[0, 1, 2, 3]], points = [[175, 1600], [175, 1770], [345, 1770], [345, 1600]]);
					}
				}
			}
			color(c = [0.1000000000, 0.1000000000, 0.1000000000]) {
				translate(v = [0, 0, 1490.0000000000]) {
					linear_extrude(height = 686.1000000000) {
						polygon(paths = [[0, 1, 2, 3]], points = [[2405, 1760], [2405, 1930], [2575, 1930], [2575, 1760]]);
					}
				}
			}
			color(c = [0.1000000000, 0.1000000000, 0.1000000000]) {
				translate(v = [0, 0, 1490.0000000000]) {
					linear_extrude(height = 686.1000000000) {
						polygon(paths = [[0, 1, 2, 3]], points = [[1980, 1915], [1980, 2085], [2150, 2085], [2150, 1915]]);
					}
				}
			}
			color(c = [0.1000000000, 0.1000000000, 0.1000000000]) {
				translate(v = [0, 0, 1490.0000000000]) {
					linear_extrude(height = 686.1000000000) {
						polygon(paths = [[0, 1, 2, 3]], points = [[2405, 2100], [2405, 2270], [2575, 2270], [2575, 2100]]);
					}
				}
			}
			color(c = [0.1000000000, 0.1000000000, 0.1000000000]) {
				translate(v = [0, 0, 1490.0000000000]) {
					linear_extrude(height = 686.1000000000) {
						polygon(paths = [[0, 1, 2, 3]], points = [[1285, 2195], [1285, 2365], [1455, 2365], [1455, 2195]]);
					}
				}
			}
			color(c = [0.1000000000, 0.1000000000, 0.1000000000]) {
				translate(v = [0, 0, 1490.0000000000]) {
					linear_extrude(height = 686.1000000000) {
						polygon(paths = [[0, 1, 2, 3]], points = [[1980, 2255], [1980, 2425], [2150, 2425], [2150, 2255]]);
					}
				}
			}
			color(c = [0.9000000000, 0.6000000000, 0.6000000000]) {
				translate(v = [0, 0, 2176.1000000000]) {
					linear_extrude(height = 100.0000000000) {
						polygon(paths = [[0, 1, 2, 3, 4, 5, 6, 7, 8, 9, 10, 11, 12, 13, 14, 15]], points = [[0, -85], [0, 85], [95, 85], [95, 585], [425, 585], [425, 85], [995, 85], [995, 485], [1325, 485], [1325, 85], [1835, 85], [1835, 485], [2215, 485], [2215, 85], [2760, 85], [2760, -85]]);
					}
				}
			}
			color(c = [0.9000000000, 0.6000000000, 0.6000000000]) {
				translate(v = [0, 0, 2176.1000000000]) {
					linear_extrude(height = 100.0000000000) {
						polygon(paths = [[0, 1, 2, 3]], points = [[90, 755], [90, 1325], [440, 1325], [440, 755]]);
					}
				}
			}
			color(c = [0.9000000000, 0.6000000000, 0.6000000000]) {
				translate(v = [0, 0, 2176.1000000000]) {
					linear_extrude(height = 100.0000000000) {
						polygon(paths = [[0, 1, 2, 3]], points = [[1490, 995], [1490, 1325], [1895, 1325], [1895, 995]]);
					}
				}
			}
			color(c = [0.9000000000, 0.6000000000, 0.6000000000]) {
				translate(v = [0, 0, 2176.1000000000]) {
					linear_extrude(height = 100.0000000000) {
						polygon(paths = [[0, 1, 2, 3]], points = [[610, 995], [610, 1615], [1320, 1615], [1320, 995]]);
					}
				}
			}
			color(c = [0.9000000000, 0.6000000000, 0.6000000000]) {
				translate(v = [0, 0, 2176.1000000000]) {
					linear_extrude(height = 100.0000000000) {
						polygon(paths = [[0, 1, 2, 3, 4, 5, 6, 7, 8, 9, 10, 11, 12, 13, 14, 15, 16, 17, 18, 19, 20, 21, 22, 23]], points = [[625, 305], [625, 825], [2065, 825], [2065, 1495], [1510, 1495], [1510, 1785], [410, 1785], [410, 1495], [90, 1495], [90, 1955], [1680, 1955], [1680, 1665], [2235, 1665], [2235, 1325], [2335, 1325], [2335, 995], [2235, 995], [2235, 655], [1665, 655], [1665, 305], [1495, 305], [1495, 655], [795, 655], [795, 305]]);
					}
				}
			}
			color(c = [0.9000000000, 0.6000000000, 0.6000000000]) {
				translate(v = [0, 0, 2176.1000000000]) {
					linear_extrude(height = 100.0000000000) {
						polygon(paths = [[0, 1, 2, 3]], points = [[90, 2125], [90, 2415], [1745, 2415], [1745, 2125]]);
					}
				}
			}
			color(c = [0.9000000000, 0.6000000000, 0.6000000000]) {
				translate(v = [0, 0, 2176.1000000000]) {
					linear_extrude(height = 100.0000000000) {
						polygon(paths = [[0, 1, 2, 3, 4, 5, 6, 7]], points = [[2405, 415], [2405, 760], [2505, 760], [2505, 1495], [2405, 1495], [2405, 2465], [2675, 2465], [2675, 415]]);
					}
				}
			}
			color(c = [0.9000000000, 0.6000000000, 0.6000000000]) {
				translate(v = [0, 0, 2176.1000000000]) {
					linear_extrude(height = 100.0000000000) {
						polygon(paths = [[0, 1, 2, 3, 4, 5, 6, 7]], points = [[1915, 1835], [1915, 2635], [0, 2635], [0, 2805], [2760, 2805], [2760, 2635], [2195, 2635], [2195, 1835]]);
					}
				}
			}
			color(c = [0.5000000000, 0.5000000000, 0.5000000000]) {
				translate(v = [0, 0, 2276.1000000000]) {
					linear_extrude(height = 340.0000000000) {
						polygon(paths = [[0, 1, 2, 3]], points = [[145, -85], [145, 85], [315, 85], [315, -85]]);
					}
				}
			}
			color(c = [0.5000000000, 0.5000000000, 0.5000000000]) {
				translate(v = [0, 0, 2276.1000000000]) {
					linear_extrude(height = 340.0000000000) {
						polygon(paths = [[0, 1, 2, 3]], points = [[605, -85], [605, 85], [775, 85], [775, -85]]);
					}
				}
			}
			color(c = [0.5000000000, 0.5000000000, 0.5000000000]) {
				translate(v = [0, 0, 2276.1000000000]) {
					linear_extrude(height = 340.0000000000) {
						polygon(paths = [[0, 1, 2, 3]], points = [[1065, -85], [1065, 85], [1235, 85], [1235, -85]]);
					}
				}
			}
			color(c = [0.5000000000, 0.5000000000, 0.5000000000]) {
				translate(v = [0, 0, 2276.1000000000]) {
					linear_extrude(height = 340.0000000000) {
						polygon(paths = [[0, 1, 2, 3]], points = [[1525, -85], [1525, 85], [1695, 85], [1695, -85]]);
					}
				}
			}
			color(c = [0.5000000000, 0.5000000000, 0.5000000000]) {
				translate(v = [0, 0, 2276.1000000000]) {
					linear_extrude(height = 340.0000000000) {
						polygon(paths = [[0, 1, 2, 3]], points = [[1985, -85], [1985, 85], [2155, 85], [2155, -85]]);
					}
				}
			}
			color(c = [0.5000000000, 0.5000000000, 0.5000000000]) {
				translate(v = [0, 0, 2276.1000000000]) {
					linear_extrude(height = 340.0000000000) {
						polygon(paths = [[0, 1, 2, 3]], points = [[2445, -85], [2445, 85], [2615, 85], [2615, -85]]);
					}
				}
			}
			color(c = [0.5000000000, 0.5000000000, 0.5000000000]) {
				translate(v = [0, 0, 2276.1000000000]) {
					linear_extrude(height = 340.0000000000) {
						polygon(paths = [[0, 1, 2, 3]], points = [[145, 2635], [145, 2805], [315, 2805], [315, 2635]]);
					}
				}
			}
			color(c = [0.5000000000, 0.5000000000, 0.5000000000]) {
				translate(v = [0, 0, 2276.1000000000]) {
					linear_extrude(height = 340.0000000000) {
						polygon(paths = [[0, 1, 2, 3]], points = [[605, 2635], [605, 2805], [775, 2805], [775, 2635]]);
					}
				}
			}
			color(c = [0.5000000000, 0.5000000000, 0.5000000000]) {
				translate(v = [0, 0, 2276.1000000000]) {
					linear_extrude(height = 340.0000000000) {
						polygon(paths = [[0, 1, 2, 3]], points = [[1065, 2635], [1065, 2805], [1235, 2805], [1235, 2635]]);
					}
				}
			}
			color(c = [0.5000000000, 0.5000000000, 0.5000000000]) {
				translate(v = [0, 0, 2276.1000000000]) {
					linear_extrude(height = 340.0000000000) {
						polygon(paths = [[0, 1, 2, 3]], points = [[1525, 2635], [1525, 2805], [1695, 2805], [1695, 2635]]);
					}
				}
			}
			color(c = [0.5000000000, 0.5000000000, 0.5000000000]) {
				translate(v = [0, 0, 2276.1000000000]) {
					linear_extrude(height = 340.0000000000) {
						polygon(paths = [[0, 1, 2, 3]], points = [[1985, 2635], [1985, 2805], [2155, 2805], [2155, 2635]]);
					}
				}
			}
			color(c = [0.5000000000, 0.5000000000, 0.5000000000]) {
				translate(v = [0, 0, 2276.1000000000]) {
					linear_extrude(height = 340.0000000000) {
						polygon(paths = [[0, 1, 2, 3]], points = [[2445, 2635], [2445, 2805], [2615, 2805], [2615, 2635]]);
					}
				}
			}
			color(c = [0.3000000000, 0.3000000000, 1]) {
				translate(v = [0, 0, 2616.1000000000]) {
					linear_extrude(height = 360.0000000000) {
						polygon(paths = [[0, 1, 2, 3]], points = [[0, -240], [0, 240], [2760, 240], [2760, -240]]);
					}
				}
			}
			color(c = [0.3000000000, 0.3000000000, 1]) {
				translate(v = [0, 0, 2616.1000000000]) {
					linear_extrude(height = 360.0000000000) {
						polygon(paths = [[0, 1, 2, 3]], points = [[0, 2480], [0, 2960], [2760, 2960], [2760, 2480]]);
					}
				}
			}
		}
	}
}
